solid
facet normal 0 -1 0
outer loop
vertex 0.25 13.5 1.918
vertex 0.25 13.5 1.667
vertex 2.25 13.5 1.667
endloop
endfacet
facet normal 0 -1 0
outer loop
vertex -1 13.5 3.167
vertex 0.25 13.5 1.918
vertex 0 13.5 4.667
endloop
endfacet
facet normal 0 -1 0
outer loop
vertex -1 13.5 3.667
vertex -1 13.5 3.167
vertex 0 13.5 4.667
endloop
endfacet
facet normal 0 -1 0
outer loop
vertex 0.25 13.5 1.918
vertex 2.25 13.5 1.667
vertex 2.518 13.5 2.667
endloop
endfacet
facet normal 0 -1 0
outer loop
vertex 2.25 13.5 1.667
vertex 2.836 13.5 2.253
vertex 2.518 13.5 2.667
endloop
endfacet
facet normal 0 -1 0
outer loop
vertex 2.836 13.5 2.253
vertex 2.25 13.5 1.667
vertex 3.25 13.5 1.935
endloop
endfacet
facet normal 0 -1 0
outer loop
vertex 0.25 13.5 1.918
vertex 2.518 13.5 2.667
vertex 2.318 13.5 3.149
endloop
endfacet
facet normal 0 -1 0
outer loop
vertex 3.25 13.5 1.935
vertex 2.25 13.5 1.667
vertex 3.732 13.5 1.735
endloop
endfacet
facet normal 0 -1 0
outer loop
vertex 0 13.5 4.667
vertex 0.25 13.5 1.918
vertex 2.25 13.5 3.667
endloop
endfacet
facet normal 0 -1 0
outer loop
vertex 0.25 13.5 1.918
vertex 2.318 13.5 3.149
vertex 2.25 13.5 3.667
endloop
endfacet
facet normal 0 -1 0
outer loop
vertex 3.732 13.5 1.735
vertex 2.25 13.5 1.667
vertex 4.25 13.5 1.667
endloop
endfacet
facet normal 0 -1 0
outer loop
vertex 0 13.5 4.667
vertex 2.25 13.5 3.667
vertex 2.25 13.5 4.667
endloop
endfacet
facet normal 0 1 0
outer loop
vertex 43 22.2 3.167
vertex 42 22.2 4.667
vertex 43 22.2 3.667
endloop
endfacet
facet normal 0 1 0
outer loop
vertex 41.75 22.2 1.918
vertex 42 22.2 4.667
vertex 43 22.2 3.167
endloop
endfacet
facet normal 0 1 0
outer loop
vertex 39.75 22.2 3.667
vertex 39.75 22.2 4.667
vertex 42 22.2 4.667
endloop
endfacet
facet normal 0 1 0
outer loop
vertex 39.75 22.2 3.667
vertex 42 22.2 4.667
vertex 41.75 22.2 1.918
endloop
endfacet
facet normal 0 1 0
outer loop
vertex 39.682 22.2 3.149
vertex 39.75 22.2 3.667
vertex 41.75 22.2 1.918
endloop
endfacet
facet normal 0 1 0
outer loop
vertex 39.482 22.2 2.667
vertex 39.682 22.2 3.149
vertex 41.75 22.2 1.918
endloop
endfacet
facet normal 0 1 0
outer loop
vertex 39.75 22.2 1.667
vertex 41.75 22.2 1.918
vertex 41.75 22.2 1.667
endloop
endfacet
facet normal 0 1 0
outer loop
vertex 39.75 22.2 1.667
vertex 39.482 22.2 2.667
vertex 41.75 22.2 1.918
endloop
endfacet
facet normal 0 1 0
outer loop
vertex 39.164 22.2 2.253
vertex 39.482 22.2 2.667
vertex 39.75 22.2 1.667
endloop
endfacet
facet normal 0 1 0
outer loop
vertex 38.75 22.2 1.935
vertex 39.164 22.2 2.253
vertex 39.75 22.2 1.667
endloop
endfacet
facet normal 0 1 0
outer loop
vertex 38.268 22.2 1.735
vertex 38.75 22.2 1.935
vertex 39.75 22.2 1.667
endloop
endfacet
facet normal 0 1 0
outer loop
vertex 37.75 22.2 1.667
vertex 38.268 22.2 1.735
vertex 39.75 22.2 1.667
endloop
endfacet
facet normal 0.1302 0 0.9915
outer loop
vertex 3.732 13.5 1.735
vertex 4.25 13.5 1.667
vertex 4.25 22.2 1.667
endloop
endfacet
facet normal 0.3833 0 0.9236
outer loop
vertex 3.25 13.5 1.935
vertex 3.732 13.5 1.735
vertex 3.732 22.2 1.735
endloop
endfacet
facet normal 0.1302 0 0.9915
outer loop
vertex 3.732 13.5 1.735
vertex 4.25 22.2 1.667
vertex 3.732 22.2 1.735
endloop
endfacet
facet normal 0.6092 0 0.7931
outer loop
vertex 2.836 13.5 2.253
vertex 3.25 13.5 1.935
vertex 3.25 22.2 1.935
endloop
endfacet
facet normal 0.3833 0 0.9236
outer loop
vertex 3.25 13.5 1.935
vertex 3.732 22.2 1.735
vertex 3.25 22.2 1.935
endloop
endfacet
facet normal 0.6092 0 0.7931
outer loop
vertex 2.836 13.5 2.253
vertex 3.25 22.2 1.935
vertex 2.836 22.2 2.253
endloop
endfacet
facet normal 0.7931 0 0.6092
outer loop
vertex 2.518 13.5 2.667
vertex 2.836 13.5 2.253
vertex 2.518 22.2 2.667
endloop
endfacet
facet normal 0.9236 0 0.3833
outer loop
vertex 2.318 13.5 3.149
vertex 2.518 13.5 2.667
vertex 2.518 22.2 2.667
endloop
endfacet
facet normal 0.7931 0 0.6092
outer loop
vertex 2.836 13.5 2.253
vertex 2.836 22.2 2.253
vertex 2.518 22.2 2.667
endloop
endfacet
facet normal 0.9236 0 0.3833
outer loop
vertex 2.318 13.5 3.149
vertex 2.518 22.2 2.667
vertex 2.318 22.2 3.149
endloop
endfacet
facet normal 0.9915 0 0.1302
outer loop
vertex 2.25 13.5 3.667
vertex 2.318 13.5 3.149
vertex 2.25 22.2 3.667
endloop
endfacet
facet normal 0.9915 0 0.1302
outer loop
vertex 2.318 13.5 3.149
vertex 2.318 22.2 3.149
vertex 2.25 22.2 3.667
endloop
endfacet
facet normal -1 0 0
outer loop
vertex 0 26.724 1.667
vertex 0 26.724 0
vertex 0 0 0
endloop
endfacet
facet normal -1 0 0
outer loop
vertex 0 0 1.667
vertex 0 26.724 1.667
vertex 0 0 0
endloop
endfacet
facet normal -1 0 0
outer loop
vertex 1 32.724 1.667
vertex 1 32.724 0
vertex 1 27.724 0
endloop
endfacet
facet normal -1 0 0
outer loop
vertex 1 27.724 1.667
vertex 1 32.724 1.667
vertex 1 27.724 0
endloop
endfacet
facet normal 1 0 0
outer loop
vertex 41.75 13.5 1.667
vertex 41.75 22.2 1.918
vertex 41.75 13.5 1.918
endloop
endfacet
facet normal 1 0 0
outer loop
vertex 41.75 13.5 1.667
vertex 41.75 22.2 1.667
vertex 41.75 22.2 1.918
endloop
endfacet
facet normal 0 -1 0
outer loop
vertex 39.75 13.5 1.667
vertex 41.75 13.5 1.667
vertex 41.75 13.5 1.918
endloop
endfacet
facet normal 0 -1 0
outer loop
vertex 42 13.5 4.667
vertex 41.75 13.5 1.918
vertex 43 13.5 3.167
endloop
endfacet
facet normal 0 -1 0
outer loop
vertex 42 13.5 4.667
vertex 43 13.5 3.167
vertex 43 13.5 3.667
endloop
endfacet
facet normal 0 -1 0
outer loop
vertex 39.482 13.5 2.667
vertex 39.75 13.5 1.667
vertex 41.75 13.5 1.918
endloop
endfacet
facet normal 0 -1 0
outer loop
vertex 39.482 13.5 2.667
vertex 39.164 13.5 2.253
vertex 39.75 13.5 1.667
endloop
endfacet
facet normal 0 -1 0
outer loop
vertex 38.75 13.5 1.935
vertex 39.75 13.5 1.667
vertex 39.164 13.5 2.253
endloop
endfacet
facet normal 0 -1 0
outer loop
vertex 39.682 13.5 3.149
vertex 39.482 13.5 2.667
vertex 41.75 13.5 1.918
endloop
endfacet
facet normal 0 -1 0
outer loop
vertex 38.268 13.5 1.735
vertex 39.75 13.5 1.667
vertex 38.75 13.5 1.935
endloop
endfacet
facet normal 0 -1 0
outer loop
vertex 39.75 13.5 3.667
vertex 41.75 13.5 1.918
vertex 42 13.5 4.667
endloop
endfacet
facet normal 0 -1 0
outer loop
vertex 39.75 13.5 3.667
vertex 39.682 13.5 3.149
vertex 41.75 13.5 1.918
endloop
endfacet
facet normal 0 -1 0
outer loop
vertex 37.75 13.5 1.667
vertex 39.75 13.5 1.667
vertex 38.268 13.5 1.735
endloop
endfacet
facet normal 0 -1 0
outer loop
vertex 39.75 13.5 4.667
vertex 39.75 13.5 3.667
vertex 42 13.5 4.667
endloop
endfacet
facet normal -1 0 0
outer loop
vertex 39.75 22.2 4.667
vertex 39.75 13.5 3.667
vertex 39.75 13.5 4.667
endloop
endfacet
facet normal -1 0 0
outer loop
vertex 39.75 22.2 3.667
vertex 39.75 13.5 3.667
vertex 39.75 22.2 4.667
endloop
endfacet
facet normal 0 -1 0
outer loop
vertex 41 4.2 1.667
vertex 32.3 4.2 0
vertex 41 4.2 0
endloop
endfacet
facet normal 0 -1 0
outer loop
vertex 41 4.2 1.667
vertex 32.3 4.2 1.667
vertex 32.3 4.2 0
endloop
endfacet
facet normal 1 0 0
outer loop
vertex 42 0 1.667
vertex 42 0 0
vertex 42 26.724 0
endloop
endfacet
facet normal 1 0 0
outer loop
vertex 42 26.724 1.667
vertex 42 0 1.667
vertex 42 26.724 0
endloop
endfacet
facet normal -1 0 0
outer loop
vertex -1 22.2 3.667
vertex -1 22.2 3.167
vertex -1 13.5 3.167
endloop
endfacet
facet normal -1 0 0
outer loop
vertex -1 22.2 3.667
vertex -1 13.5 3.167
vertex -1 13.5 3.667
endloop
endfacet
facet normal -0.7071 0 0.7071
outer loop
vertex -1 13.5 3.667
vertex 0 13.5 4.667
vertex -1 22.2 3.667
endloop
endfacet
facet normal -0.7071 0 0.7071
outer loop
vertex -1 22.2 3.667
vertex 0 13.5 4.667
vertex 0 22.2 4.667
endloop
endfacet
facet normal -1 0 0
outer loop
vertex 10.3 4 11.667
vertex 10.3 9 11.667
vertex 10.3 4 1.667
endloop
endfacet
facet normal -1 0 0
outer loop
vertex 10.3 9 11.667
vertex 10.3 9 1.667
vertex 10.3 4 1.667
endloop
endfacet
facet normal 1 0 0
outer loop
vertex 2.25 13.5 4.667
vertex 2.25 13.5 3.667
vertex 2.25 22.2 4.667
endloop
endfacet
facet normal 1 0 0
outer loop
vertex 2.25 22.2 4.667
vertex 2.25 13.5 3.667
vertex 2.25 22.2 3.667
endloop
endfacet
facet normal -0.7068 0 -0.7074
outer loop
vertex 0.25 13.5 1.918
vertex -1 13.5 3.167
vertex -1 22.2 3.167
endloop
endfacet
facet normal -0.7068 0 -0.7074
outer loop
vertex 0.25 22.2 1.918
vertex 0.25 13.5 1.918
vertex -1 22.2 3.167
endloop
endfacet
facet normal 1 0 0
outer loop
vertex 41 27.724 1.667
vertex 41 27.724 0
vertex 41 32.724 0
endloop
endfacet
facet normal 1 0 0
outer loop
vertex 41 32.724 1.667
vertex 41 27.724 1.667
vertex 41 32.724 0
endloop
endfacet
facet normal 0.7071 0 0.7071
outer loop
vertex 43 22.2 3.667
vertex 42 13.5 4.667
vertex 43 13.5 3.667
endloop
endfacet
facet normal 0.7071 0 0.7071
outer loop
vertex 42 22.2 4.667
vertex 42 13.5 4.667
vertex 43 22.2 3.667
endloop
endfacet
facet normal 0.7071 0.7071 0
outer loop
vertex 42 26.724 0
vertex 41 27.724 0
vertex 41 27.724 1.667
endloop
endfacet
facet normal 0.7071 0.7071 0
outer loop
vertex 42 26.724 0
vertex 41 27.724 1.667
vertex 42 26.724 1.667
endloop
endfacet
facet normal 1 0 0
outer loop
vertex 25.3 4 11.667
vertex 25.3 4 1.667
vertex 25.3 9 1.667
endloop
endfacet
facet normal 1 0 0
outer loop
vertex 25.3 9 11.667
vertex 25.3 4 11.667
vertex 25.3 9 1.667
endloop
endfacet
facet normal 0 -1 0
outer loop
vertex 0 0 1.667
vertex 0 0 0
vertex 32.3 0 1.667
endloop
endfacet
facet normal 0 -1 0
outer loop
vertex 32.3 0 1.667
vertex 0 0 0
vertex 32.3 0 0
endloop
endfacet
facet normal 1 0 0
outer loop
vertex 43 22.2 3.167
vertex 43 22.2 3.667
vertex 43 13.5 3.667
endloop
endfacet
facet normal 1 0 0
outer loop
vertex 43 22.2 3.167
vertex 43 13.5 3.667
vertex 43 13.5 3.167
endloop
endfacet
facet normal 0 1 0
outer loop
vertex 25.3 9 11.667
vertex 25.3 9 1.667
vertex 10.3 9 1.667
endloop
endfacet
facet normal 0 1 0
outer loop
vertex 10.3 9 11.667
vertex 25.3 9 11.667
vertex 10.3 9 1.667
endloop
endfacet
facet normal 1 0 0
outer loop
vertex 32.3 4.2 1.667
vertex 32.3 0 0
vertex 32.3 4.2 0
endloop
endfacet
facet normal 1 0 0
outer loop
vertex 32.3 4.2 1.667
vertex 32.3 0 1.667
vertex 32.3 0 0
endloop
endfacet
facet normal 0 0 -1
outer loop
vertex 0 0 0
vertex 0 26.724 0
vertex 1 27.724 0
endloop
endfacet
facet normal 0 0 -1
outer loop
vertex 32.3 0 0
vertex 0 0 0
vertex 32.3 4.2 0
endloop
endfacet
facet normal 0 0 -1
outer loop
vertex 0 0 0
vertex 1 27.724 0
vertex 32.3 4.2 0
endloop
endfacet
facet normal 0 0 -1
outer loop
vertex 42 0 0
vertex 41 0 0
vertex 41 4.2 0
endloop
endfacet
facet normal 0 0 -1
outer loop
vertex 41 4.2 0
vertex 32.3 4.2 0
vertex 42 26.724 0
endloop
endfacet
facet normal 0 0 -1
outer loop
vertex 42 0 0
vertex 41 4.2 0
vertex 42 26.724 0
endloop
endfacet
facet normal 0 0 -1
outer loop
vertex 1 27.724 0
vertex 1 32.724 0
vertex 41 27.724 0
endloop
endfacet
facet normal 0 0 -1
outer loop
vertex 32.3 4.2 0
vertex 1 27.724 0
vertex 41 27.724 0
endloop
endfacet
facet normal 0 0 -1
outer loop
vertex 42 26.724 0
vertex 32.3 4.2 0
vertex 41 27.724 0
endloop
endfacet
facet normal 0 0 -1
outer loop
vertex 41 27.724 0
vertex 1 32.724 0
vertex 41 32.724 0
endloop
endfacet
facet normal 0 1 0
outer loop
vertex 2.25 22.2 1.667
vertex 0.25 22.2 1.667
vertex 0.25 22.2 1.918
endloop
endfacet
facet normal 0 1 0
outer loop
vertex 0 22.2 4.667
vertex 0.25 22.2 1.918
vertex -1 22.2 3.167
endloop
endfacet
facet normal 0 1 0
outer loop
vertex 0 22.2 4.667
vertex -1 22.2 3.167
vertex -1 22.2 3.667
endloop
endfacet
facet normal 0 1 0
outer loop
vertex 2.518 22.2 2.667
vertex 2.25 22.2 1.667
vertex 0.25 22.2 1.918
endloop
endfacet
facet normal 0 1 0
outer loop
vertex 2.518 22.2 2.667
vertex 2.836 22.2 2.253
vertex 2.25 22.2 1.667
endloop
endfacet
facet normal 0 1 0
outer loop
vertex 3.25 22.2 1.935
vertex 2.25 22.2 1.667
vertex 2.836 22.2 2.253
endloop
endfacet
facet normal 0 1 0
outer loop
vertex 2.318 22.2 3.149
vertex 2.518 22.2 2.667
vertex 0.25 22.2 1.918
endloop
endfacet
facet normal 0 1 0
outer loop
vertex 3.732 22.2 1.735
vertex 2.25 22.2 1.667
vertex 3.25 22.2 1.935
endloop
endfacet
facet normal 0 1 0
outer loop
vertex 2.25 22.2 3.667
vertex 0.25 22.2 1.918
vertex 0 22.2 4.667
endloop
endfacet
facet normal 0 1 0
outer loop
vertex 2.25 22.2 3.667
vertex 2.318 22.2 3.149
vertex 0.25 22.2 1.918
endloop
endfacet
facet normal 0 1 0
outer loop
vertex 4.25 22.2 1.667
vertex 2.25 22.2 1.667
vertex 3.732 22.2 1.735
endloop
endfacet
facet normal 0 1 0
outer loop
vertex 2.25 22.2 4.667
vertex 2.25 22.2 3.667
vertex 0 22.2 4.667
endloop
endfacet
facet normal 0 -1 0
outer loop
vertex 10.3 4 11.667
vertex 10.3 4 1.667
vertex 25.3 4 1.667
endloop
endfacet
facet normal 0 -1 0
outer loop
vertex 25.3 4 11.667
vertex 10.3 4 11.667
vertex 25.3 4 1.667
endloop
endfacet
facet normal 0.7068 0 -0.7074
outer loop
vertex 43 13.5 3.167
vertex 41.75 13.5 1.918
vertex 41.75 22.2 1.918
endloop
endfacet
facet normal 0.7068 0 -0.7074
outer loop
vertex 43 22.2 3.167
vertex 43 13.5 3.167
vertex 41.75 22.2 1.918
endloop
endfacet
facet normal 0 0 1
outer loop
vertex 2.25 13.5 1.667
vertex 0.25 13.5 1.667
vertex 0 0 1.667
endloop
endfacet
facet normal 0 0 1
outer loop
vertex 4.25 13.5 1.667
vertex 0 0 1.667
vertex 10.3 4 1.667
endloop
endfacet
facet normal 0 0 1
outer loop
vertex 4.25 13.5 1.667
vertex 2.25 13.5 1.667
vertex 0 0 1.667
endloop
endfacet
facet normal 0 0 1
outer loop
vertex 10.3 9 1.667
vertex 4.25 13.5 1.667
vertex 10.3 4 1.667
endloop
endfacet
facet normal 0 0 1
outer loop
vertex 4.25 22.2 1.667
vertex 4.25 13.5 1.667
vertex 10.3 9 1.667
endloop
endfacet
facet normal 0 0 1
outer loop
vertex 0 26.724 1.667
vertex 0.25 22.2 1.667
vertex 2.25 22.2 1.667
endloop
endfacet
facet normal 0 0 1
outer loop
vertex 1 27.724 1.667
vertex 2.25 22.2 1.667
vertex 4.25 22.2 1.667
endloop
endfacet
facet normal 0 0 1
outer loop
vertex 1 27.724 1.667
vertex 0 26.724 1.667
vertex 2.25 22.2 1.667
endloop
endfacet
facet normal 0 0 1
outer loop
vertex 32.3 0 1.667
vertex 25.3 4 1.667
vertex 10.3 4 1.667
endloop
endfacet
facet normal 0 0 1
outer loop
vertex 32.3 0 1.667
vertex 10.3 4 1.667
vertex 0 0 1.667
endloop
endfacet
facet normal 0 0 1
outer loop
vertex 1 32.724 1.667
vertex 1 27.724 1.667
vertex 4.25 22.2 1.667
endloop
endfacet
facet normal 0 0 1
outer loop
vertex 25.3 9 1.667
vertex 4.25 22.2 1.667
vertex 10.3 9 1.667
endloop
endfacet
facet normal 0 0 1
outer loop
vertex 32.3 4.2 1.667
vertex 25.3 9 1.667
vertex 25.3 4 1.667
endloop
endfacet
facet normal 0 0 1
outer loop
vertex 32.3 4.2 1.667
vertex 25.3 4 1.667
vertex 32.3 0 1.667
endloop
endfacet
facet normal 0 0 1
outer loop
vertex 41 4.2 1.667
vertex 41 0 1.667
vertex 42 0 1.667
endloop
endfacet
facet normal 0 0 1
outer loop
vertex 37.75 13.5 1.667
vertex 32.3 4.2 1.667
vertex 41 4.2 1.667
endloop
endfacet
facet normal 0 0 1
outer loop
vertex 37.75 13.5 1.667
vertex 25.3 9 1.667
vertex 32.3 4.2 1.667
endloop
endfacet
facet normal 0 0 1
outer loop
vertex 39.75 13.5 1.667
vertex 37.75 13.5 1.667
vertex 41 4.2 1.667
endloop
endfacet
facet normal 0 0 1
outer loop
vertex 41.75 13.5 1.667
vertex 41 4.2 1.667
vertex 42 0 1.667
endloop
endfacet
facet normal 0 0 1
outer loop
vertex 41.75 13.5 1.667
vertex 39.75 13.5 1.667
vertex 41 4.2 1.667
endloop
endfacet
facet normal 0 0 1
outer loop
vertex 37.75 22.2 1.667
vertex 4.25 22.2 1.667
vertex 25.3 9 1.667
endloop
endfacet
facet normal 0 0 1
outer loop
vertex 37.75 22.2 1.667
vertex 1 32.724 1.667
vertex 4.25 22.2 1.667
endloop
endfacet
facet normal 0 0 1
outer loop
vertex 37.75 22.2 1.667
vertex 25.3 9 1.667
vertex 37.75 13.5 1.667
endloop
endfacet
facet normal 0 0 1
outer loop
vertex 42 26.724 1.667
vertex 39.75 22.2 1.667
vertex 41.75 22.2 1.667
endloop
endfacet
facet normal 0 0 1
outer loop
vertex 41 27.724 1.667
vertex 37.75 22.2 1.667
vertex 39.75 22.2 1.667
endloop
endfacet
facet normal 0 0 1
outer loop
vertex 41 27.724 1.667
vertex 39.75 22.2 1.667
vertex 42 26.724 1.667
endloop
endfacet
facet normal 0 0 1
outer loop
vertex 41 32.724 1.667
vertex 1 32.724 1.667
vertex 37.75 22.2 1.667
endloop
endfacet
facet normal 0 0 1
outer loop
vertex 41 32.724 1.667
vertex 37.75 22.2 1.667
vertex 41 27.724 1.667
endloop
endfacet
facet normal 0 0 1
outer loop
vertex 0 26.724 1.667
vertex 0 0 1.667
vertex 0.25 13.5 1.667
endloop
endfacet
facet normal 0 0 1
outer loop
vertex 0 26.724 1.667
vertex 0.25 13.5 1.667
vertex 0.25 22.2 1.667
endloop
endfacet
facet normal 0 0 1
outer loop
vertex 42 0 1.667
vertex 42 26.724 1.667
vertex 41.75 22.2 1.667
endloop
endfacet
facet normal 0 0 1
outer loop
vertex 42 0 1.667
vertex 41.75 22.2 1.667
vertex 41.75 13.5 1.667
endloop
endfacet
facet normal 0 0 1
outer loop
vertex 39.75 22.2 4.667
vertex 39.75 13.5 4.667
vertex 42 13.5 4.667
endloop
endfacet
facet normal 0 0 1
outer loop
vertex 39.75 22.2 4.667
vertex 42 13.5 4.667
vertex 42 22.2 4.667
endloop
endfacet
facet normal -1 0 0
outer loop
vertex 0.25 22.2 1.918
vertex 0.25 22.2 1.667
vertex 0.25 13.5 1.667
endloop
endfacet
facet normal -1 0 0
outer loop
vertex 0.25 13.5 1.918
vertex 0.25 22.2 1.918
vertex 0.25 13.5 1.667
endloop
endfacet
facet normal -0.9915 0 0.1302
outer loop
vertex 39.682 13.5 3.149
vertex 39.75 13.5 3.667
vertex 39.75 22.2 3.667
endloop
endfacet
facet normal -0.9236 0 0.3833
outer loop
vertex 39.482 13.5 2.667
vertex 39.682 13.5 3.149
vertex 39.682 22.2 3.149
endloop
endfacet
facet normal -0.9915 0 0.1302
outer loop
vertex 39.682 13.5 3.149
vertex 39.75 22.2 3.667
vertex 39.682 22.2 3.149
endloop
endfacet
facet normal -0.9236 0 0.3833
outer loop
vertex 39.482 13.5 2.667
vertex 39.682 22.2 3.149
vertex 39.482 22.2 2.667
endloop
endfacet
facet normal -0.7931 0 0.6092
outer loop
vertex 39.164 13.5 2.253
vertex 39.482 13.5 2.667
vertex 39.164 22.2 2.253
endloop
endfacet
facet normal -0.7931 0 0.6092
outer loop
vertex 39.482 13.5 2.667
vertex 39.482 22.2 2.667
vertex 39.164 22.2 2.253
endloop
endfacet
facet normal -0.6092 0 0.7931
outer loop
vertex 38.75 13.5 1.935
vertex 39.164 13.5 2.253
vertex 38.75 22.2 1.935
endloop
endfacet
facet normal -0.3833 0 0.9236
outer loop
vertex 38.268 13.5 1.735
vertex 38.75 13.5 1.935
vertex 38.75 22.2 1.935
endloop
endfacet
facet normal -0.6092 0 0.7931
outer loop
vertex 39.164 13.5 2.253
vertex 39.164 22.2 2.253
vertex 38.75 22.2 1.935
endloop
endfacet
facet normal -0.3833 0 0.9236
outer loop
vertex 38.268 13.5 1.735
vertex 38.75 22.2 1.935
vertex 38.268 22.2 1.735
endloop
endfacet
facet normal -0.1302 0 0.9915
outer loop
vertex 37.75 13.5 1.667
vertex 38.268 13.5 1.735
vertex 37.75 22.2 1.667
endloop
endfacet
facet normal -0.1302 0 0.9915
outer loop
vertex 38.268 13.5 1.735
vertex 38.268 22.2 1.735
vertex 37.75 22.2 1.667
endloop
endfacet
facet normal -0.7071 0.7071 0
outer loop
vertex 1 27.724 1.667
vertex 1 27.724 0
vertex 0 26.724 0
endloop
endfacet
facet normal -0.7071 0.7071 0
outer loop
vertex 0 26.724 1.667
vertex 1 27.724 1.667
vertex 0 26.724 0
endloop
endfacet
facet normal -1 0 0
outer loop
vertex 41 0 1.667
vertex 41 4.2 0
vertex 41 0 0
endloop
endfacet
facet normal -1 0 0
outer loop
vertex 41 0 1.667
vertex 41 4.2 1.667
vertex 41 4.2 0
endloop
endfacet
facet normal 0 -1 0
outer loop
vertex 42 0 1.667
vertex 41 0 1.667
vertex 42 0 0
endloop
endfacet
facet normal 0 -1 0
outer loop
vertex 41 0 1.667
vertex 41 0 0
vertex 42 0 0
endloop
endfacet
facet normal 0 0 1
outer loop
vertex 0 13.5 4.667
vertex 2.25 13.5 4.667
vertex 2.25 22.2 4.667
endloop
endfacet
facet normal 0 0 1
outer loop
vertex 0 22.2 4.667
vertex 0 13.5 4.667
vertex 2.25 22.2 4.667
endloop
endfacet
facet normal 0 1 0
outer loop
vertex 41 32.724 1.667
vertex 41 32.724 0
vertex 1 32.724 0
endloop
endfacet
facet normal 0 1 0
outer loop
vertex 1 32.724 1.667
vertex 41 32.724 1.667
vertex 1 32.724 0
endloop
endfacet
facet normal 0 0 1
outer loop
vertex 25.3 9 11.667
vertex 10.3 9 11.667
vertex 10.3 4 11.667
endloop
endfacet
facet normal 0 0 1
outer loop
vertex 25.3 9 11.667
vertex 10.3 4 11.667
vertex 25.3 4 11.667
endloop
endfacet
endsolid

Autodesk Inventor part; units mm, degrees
ref_plane "YZ Plane" through (0, 0, 0) normal (1, 0, 0) x (0, 1, 0)
ref_plane "XZ Plane" through (0, 0, 0) normal (0, 1, 0) x (-1, 0, 0)
ref_plane "XY Plane" through (0, 0, 0) normal (0, 0, 1) x (1, 0, 0)
sketch "Sketch1" plane through (0, 0, 0) normal (0, 0, 1) x (1, 0, 0)
  line L0 (0, 0) -> (42, 0)
  line L1 (42, 0) -> (42, 26.724)
  line L2 (0, 26.724) -> (0, 26.724)
  line L3 (0, 26.724) -> (0, 0)
  line L4 (1, 26.724) -> (41, 26.724)
  line L5 (41, 27.724) -> (41, 32.724)
  line L6 (41, 32.724) -> (1, 32.724)
  line L7 (1, 32.724) -> (1, 27.724)
  line L8 (1, 27.724) -> (0, 26.724)
  line L9 (42, 26.724) -> (42, 26.724)
  line L10 (41, 27.724) -> (42, 26.724)
  point P0 (42, 26.724)
  dimension "d0" = 26.724
  dimension "d1" = 42
  dimension "d2" = 0
  dimension "d3" = 40
  dimension "d4" = 1
  dimension "d5" = 1
  dimension "d6" = 1
  dimension "d7" = 1
  dimension "d8" = 1
  dimension "d9" = 5
extrude "Extrusion1" add sketch "Sketch1" along normal blind 1.667
sketch "Sketch2" plane through (0, 0, 1.667) normal (0, 0, 1) x (1, 0, 0)
  line L0 (32.3, 4.2) -> (41, 4.2)
  line L1 (41, 4.2) -> (41, 0)
  line L2 (41, 0) -> (32.3, 0)
  line L3 (32.3, 0) -> (32.3, 4.2)
  line L4 (0, 0) -> (42, 0) projected
  line L5 (1, 32.724) -> (1, 27.724) projected
  line L6 (41, 27.724) -> (41, 32.724) projected
  dimension "d12" = 0
  dimension "d14" = 8.7
  dimension "d15" = 4.2
  dimension "d18" = 0
extrude "Extrusion2" cut sketch "Sketch2" against normal blind 2.083
sketch "Sketch3" plane through (0, 0, 1.667) normal (0, 0, 1) x (1, 0, 0)
  line L0 (41.75, 13.5) -> (39.75, 13.5)
  line L1 (39.75, 13.5) -> (39.75, 22.2)
  line L2 (39.75, 22.2) -> (41.75, 22.2)
  line L3 (41.75, 22.2) -> (41.75, 13.5)
  line L4 (0.25, 13.5) -> (2.25, 13.5)
  line L5 (2.25, 13.5) -> (2.25, 22.2)
  line L6 (2.25, 22.2) -> (0.25, 22.2)
  line L7 (0.25, 22.2) -> (0.25, 13.5)
  line L8 (0, 0) -> (32.3, 0) projected
  line L9 (0, 26.724) -> (0, 0) projected
  line L10 (42, 0) -> (42, 26.724) projected
  dimension "d19" = 13.5
  dimension "d20" = 0
  dimension "d21" = 22.2
  dimension "d22" = 0
  dimension "d23" = 0.25
  dimension "d24" = 0.25
  dimension "d25" = 2
  dimension "d26" = 2
extrude "Extrusion3" add sketch "Sketch3" along normal blind 3
sketch "Sketch4" plane through (0.25, 13.5, 1.667) normal (-1, 0, 0) x (0, 0, 1)
  line L0 (0, 8.7) -> (3, 8.7) projected
  line L1 (3, 8.7) -> (1.5, 8.7)
  line L2 (1.5, 8.7) -> (1.5, 0)
  line L3 (1.5, 0) -> (3, 0)
  line L4 (3, 0) -> (3, 8.7)
  line L5 (0, 0) -> (3, 0) projected
  line L6 (0, 13.224) -> (0, -13.5) projected
  point P0 (-1.667, -13.5)
  dimension "d29" = 0
  dimension "d30" = 1.5
extrude "Extrusion4" add sketch "Sketch4" along normal blind 1.25 contours L0 L4 L3 L2
sketch "Sketch5" plane through (41.75, 13.5, 1.667) normal (1, 0, 0) x (0, 0, -1)
  line L0 (-3, 0) -> (-3, 8.7) projected
  line L1 (-3, 8.7) -> (-1.5, 8.7)
  line L2 (-1.5, 8.7) -> (-1.5, 0)
  line L3 (-1.5, 0) -> (-3, 0)
  line L4 (-3, 0) -> (-3, 8.7)
  line L5 (0, -13.5) -> (0, 13.224) projected
  line L6 (0, 0) -> (-3, 0) projected
  point P0 (1.667, -13.5)
  dimension "d33" = 1.5
  dimension "d34" = 0
extrude "Extrusion5" add sketch "Sketch5" along normal blind 1.25
chamfer "Chamfer1" distance 1.25 angle 45 2 edges at (41.75, 17.85, 3.167) (0.25, 17.85, 3.167)
sketch "Sketch6" plane through (0, 0, 1.667) normal (0, 0, 1) x (1, 0, 0)
  line L0 (10.3, 4) -> (25.3, 4)
  line L1 (25.3, 4) -> (25.3, 9)
  line L2 (25.3, 9) -> (10.3, 9)
  line L3 (10.3, 9) -> (10.3, 4)
  line L4 (0, 0) -> (32.3, 0) projected
  line L5 (32.3, 0) -> (32.3, 4.2) projected
  dimension "d40" = 4
  dimension "d41" = 15
  dimension "d42" = 5
  dimension "d43" = 7
extrude "Extrusion6" add sketch "Sketch6" along normal blind 10
chamfer "Chamfer2" distance 1 angle 45 2 edges at (43, 17.85, 4.667) (-1, 17.85, 4.667)
fillet "Fillet1" radius 2 2 edges at (39.75, 17.85, 1.667) (2.25, 17.85, 1.667)
equation "\"d6\" = d5"
equation "\"d8\" = d7"
properties part number "eonPCBcover"
